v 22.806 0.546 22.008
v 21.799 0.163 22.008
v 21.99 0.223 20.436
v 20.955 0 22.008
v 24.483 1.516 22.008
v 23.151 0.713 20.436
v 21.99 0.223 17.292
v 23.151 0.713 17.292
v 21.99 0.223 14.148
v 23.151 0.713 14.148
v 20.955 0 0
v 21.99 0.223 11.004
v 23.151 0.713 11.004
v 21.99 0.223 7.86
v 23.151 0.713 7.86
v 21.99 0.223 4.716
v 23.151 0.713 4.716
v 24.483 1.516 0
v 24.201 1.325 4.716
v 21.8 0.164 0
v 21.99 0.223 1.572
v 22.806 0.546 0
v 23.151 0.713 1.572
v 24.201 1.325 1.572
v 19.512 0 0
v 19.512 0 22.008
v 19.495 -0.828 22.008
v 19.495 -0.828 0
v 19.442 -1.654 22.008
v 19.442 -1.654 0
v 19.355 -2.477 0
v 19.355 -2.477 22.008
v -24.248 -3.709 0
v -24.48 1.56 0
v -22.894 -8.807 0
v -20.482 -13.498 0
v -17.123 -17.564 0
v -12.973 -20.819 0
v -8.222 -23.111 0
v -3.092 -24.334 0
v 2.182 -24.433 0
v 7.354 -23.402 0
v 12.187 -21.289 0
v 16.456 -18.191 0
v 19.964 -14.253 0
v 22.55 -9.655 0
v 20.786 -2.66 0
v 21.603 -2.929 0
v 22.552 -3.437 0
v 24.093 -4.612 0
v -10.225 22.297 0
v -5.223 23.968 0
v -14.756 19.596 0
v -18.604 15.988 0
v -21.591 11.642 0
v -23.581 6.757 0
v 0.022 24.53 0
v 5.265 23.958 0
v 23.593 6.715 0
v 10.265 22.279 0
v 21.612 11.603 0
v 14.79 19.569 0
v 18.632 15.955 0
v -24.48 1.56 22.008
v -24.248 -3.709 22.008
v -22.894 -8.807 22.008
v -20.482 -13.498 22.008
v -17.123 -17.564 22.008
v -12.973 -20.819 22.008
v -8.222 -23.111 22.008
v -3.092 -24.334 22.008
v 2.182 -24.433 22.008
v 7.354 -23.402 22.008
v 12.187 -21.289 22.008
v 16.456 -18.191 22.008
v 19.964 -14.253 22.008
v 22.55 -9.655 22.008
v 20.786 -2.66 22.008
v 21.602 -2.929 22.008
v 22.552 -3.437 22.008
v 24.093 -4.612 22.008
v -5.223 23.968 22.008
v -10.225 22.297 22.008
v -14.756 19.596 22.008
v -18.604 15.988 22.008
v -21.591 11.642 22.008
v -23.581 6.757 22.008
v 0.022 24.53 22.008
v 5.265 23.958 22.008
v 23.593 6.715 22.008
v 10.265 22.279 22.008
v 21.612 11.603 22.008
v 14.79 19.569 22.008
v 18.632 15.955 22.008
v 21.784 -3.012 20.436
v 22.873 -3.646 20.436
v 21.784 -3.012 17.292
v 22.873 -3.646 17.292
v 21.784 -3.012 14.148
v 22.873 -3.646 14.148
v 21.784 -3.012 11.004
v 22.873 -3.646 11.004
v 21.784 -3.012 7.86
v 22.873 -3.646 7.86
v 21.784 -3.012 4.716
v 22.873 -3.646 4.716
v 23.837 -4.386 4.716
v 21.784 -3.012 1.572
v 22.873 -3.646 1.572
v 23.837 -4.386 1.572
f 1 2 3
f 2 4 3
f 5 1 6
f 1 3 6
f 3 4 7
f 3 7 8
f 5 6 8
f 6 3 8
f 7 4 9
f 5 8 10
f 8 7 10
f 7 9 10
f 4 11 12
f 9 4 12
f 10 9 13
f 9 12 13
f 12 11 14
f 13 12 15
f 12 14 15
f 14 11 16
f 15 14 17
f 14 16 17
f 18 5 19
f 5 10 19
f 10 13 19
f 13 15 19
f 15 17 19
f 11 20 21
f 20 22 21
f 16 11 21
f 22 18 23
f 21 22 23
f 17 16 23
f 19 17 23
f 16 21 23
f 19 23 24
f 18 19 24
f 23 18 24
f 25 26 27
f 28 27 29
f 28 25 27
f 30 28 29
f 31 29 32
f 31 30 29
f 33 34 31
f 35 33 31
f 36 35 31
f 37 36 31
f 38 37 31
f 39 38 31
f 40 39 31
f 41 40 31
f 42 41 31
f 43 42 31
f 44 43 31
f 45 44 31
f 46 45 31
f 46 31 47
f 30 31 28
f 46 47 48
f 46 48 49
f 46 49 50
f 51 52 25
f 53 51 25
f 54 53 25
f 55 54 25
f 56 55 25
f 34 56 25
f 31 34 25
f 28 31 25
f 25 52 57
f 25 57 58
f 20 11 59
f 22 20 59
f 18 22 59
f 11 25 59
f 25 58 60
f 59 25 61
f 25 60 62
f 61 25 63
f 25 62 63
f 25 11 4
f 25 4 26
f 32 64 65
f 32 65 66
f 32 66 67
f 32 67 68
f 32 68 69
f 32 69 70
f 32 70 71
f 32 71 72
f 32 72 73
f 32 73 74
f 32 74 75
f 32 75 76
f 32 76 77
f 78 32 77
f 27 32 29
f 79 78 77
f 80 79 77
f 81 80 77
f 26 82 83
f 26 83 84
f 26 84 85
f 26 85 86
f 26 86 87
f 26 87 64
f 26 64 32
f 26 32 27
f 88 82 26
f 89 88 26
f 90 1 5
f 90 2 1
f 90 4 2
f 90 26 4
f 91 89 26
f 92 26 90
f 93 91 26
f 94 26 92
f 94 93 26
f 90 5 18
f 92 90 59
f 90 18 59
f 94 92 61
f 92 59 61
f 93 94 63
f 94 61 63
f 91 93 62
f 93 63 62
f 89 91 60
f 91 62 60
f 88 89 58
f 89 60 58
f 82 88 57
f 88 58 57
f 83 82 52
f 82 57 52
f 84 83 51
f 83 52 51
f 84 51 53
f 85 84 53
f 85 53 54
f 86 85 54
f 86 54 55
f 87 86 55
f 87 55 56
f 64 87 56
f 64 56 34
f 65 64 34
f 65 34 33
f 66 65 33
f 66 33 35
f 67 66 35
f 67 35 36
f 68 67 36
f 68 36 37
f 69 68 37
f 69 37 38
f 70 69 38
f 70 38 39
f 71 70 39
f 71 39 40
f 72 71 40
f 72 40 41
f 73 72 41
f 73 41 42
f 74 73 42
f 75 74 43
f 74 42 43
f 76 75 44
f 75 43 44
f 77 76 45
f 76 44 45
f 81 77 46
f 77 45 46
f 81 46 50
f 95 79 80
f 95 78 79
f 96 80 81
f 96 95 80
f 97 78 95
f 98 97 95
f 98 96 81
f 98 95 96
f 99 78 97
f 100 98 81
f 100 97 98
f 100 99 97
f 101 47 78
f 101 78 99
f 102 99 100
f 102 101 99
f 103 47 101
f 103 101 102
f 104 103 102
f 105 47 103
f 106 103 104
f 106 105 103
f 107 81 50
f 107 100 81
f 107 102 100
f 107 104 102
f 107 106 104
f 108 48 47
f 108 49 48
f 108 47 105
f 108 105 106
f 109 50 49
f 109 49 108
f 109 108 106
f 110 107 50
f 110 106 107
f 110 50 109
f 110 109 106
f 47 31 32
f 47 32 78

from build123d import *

# Parameters (mm, degrees)
SKETCH1_R               = 24.53
BOSS_EXTRUDE1_DEPTH     = 22.008152455
CUT_EXTRUDE3_DEPTH      = 23.008152455
CUT_EXTRUDE3_DEPTH_BACK = 1


with BuildPart() as part:
    # Sketch1 → Boss-Extrude1 (new body)
    with BuildSketch(Plane.XY):
        Circle(SKETCH1_R)
    extrude(amount=BOSS_EXTRUDE1_DEPTH)

    # Sketch2 → Cut-Extrude3 (cut, two sides)
    with BuildSketch(Plane.XY) as cut_extrude3_sk:
        with BuildLine():
            Line((20.955145444, 0), (19.5125, 0))
            ThreePointArc((19.5125, 0), (19.473005706, -1.240848518), (19.354682699, -2.476673954))
            Line((19.354682699, -2.476673954), (20.785660011, -2.659785415))
            add(Edge.make_bspline(
                [(20.785660011, -2.659785415), (20.800985299, -2.662076983), (20.843806968, -2.669507053), (20.924073429, -2.687499122), (21.05378572, -2.72241867), (21.216979197, -2.774995556), (21.425137234, -2.852162258), (21.666388368, -2.954705307), (21.926945547, -3.07951949), (22.20493909, -3.228005325), (22.477187641, -3.387439173), (22.743526717, -3.556434161), (23.004180465, -3.734229594), (23.313555372, -3.959446459), (23.619528341, -4.200366277), (23.856411219, -4.400665356), (24.029365424, -4.554471972), (24.092590531, -4.611722182)],
                knots=[0, 0, 0, 0, 0, 0.005376748, 0.015083688, 0.02853182, 0.046610139, 0.064854849, 0.092110525, 0.119476175, 0.146842495, 0.174208853, 0.201574955, 0.228941013, 0.256307345, 0.307035032, 0.336633369, 0.336633369, 0.336633369, 0.336633369, 0.336633369], degree=4))
            ThreePointArc((24.092590531, -4.611722182), (24.420402799, -2.316209648), (24.53, 0))
            ThreePointArc((24.53, 0), (24.518268205, 0.75856723), (24.483084041, 1.51640887))
            add(Edge.make_bspline(
                [(20.955145444, 0), (20.970637643, 0.000327832), (21.014056051, 0.002262558), (21.095957005, 0.009921081), (21.229052435, 0.028094135), (21.397599457, 0.059532029), (21.613868491, 0.109653615), (21.866183922, 0.180745878), (22.140476071, 0.271478677), (22.435068144, 0.383478516), (22.725351294, 0.507067017), (23.010986338, 0.640889404), (23.292099055, 0.784162682), (23.627557961, 0.96828979), (23.961635582, 1.168424644), (24.222026021, 1.337036737), (24.413103669, 1.467646709), (24.483084041, 1.51640887)],
                knots=[0, 0, 0, 0, 0, 0.005376748, 0.015083688, 0.02853182, 0.046610139, 0.064854849, 0.092110525, 0.119476175, 0.146842495, 0.174208853, 0.201574955, 0.228941013, 0.256307345, 0.307035032, 0.336633369, 0.336633369, 0.336633369, 0.336633369, 0.336633369], degree=4))
        make_face()
    extrude(amount=CUT_EXTRUDE3_DEPTH, mode=Mode.SUBTRACT)
    extrude(cut_extrude3_sk.sketch, amount=-CUT_EXTRUDE3_DEPTH_BACK, mode=Mode.SUBTRACT)


solid = part.part
